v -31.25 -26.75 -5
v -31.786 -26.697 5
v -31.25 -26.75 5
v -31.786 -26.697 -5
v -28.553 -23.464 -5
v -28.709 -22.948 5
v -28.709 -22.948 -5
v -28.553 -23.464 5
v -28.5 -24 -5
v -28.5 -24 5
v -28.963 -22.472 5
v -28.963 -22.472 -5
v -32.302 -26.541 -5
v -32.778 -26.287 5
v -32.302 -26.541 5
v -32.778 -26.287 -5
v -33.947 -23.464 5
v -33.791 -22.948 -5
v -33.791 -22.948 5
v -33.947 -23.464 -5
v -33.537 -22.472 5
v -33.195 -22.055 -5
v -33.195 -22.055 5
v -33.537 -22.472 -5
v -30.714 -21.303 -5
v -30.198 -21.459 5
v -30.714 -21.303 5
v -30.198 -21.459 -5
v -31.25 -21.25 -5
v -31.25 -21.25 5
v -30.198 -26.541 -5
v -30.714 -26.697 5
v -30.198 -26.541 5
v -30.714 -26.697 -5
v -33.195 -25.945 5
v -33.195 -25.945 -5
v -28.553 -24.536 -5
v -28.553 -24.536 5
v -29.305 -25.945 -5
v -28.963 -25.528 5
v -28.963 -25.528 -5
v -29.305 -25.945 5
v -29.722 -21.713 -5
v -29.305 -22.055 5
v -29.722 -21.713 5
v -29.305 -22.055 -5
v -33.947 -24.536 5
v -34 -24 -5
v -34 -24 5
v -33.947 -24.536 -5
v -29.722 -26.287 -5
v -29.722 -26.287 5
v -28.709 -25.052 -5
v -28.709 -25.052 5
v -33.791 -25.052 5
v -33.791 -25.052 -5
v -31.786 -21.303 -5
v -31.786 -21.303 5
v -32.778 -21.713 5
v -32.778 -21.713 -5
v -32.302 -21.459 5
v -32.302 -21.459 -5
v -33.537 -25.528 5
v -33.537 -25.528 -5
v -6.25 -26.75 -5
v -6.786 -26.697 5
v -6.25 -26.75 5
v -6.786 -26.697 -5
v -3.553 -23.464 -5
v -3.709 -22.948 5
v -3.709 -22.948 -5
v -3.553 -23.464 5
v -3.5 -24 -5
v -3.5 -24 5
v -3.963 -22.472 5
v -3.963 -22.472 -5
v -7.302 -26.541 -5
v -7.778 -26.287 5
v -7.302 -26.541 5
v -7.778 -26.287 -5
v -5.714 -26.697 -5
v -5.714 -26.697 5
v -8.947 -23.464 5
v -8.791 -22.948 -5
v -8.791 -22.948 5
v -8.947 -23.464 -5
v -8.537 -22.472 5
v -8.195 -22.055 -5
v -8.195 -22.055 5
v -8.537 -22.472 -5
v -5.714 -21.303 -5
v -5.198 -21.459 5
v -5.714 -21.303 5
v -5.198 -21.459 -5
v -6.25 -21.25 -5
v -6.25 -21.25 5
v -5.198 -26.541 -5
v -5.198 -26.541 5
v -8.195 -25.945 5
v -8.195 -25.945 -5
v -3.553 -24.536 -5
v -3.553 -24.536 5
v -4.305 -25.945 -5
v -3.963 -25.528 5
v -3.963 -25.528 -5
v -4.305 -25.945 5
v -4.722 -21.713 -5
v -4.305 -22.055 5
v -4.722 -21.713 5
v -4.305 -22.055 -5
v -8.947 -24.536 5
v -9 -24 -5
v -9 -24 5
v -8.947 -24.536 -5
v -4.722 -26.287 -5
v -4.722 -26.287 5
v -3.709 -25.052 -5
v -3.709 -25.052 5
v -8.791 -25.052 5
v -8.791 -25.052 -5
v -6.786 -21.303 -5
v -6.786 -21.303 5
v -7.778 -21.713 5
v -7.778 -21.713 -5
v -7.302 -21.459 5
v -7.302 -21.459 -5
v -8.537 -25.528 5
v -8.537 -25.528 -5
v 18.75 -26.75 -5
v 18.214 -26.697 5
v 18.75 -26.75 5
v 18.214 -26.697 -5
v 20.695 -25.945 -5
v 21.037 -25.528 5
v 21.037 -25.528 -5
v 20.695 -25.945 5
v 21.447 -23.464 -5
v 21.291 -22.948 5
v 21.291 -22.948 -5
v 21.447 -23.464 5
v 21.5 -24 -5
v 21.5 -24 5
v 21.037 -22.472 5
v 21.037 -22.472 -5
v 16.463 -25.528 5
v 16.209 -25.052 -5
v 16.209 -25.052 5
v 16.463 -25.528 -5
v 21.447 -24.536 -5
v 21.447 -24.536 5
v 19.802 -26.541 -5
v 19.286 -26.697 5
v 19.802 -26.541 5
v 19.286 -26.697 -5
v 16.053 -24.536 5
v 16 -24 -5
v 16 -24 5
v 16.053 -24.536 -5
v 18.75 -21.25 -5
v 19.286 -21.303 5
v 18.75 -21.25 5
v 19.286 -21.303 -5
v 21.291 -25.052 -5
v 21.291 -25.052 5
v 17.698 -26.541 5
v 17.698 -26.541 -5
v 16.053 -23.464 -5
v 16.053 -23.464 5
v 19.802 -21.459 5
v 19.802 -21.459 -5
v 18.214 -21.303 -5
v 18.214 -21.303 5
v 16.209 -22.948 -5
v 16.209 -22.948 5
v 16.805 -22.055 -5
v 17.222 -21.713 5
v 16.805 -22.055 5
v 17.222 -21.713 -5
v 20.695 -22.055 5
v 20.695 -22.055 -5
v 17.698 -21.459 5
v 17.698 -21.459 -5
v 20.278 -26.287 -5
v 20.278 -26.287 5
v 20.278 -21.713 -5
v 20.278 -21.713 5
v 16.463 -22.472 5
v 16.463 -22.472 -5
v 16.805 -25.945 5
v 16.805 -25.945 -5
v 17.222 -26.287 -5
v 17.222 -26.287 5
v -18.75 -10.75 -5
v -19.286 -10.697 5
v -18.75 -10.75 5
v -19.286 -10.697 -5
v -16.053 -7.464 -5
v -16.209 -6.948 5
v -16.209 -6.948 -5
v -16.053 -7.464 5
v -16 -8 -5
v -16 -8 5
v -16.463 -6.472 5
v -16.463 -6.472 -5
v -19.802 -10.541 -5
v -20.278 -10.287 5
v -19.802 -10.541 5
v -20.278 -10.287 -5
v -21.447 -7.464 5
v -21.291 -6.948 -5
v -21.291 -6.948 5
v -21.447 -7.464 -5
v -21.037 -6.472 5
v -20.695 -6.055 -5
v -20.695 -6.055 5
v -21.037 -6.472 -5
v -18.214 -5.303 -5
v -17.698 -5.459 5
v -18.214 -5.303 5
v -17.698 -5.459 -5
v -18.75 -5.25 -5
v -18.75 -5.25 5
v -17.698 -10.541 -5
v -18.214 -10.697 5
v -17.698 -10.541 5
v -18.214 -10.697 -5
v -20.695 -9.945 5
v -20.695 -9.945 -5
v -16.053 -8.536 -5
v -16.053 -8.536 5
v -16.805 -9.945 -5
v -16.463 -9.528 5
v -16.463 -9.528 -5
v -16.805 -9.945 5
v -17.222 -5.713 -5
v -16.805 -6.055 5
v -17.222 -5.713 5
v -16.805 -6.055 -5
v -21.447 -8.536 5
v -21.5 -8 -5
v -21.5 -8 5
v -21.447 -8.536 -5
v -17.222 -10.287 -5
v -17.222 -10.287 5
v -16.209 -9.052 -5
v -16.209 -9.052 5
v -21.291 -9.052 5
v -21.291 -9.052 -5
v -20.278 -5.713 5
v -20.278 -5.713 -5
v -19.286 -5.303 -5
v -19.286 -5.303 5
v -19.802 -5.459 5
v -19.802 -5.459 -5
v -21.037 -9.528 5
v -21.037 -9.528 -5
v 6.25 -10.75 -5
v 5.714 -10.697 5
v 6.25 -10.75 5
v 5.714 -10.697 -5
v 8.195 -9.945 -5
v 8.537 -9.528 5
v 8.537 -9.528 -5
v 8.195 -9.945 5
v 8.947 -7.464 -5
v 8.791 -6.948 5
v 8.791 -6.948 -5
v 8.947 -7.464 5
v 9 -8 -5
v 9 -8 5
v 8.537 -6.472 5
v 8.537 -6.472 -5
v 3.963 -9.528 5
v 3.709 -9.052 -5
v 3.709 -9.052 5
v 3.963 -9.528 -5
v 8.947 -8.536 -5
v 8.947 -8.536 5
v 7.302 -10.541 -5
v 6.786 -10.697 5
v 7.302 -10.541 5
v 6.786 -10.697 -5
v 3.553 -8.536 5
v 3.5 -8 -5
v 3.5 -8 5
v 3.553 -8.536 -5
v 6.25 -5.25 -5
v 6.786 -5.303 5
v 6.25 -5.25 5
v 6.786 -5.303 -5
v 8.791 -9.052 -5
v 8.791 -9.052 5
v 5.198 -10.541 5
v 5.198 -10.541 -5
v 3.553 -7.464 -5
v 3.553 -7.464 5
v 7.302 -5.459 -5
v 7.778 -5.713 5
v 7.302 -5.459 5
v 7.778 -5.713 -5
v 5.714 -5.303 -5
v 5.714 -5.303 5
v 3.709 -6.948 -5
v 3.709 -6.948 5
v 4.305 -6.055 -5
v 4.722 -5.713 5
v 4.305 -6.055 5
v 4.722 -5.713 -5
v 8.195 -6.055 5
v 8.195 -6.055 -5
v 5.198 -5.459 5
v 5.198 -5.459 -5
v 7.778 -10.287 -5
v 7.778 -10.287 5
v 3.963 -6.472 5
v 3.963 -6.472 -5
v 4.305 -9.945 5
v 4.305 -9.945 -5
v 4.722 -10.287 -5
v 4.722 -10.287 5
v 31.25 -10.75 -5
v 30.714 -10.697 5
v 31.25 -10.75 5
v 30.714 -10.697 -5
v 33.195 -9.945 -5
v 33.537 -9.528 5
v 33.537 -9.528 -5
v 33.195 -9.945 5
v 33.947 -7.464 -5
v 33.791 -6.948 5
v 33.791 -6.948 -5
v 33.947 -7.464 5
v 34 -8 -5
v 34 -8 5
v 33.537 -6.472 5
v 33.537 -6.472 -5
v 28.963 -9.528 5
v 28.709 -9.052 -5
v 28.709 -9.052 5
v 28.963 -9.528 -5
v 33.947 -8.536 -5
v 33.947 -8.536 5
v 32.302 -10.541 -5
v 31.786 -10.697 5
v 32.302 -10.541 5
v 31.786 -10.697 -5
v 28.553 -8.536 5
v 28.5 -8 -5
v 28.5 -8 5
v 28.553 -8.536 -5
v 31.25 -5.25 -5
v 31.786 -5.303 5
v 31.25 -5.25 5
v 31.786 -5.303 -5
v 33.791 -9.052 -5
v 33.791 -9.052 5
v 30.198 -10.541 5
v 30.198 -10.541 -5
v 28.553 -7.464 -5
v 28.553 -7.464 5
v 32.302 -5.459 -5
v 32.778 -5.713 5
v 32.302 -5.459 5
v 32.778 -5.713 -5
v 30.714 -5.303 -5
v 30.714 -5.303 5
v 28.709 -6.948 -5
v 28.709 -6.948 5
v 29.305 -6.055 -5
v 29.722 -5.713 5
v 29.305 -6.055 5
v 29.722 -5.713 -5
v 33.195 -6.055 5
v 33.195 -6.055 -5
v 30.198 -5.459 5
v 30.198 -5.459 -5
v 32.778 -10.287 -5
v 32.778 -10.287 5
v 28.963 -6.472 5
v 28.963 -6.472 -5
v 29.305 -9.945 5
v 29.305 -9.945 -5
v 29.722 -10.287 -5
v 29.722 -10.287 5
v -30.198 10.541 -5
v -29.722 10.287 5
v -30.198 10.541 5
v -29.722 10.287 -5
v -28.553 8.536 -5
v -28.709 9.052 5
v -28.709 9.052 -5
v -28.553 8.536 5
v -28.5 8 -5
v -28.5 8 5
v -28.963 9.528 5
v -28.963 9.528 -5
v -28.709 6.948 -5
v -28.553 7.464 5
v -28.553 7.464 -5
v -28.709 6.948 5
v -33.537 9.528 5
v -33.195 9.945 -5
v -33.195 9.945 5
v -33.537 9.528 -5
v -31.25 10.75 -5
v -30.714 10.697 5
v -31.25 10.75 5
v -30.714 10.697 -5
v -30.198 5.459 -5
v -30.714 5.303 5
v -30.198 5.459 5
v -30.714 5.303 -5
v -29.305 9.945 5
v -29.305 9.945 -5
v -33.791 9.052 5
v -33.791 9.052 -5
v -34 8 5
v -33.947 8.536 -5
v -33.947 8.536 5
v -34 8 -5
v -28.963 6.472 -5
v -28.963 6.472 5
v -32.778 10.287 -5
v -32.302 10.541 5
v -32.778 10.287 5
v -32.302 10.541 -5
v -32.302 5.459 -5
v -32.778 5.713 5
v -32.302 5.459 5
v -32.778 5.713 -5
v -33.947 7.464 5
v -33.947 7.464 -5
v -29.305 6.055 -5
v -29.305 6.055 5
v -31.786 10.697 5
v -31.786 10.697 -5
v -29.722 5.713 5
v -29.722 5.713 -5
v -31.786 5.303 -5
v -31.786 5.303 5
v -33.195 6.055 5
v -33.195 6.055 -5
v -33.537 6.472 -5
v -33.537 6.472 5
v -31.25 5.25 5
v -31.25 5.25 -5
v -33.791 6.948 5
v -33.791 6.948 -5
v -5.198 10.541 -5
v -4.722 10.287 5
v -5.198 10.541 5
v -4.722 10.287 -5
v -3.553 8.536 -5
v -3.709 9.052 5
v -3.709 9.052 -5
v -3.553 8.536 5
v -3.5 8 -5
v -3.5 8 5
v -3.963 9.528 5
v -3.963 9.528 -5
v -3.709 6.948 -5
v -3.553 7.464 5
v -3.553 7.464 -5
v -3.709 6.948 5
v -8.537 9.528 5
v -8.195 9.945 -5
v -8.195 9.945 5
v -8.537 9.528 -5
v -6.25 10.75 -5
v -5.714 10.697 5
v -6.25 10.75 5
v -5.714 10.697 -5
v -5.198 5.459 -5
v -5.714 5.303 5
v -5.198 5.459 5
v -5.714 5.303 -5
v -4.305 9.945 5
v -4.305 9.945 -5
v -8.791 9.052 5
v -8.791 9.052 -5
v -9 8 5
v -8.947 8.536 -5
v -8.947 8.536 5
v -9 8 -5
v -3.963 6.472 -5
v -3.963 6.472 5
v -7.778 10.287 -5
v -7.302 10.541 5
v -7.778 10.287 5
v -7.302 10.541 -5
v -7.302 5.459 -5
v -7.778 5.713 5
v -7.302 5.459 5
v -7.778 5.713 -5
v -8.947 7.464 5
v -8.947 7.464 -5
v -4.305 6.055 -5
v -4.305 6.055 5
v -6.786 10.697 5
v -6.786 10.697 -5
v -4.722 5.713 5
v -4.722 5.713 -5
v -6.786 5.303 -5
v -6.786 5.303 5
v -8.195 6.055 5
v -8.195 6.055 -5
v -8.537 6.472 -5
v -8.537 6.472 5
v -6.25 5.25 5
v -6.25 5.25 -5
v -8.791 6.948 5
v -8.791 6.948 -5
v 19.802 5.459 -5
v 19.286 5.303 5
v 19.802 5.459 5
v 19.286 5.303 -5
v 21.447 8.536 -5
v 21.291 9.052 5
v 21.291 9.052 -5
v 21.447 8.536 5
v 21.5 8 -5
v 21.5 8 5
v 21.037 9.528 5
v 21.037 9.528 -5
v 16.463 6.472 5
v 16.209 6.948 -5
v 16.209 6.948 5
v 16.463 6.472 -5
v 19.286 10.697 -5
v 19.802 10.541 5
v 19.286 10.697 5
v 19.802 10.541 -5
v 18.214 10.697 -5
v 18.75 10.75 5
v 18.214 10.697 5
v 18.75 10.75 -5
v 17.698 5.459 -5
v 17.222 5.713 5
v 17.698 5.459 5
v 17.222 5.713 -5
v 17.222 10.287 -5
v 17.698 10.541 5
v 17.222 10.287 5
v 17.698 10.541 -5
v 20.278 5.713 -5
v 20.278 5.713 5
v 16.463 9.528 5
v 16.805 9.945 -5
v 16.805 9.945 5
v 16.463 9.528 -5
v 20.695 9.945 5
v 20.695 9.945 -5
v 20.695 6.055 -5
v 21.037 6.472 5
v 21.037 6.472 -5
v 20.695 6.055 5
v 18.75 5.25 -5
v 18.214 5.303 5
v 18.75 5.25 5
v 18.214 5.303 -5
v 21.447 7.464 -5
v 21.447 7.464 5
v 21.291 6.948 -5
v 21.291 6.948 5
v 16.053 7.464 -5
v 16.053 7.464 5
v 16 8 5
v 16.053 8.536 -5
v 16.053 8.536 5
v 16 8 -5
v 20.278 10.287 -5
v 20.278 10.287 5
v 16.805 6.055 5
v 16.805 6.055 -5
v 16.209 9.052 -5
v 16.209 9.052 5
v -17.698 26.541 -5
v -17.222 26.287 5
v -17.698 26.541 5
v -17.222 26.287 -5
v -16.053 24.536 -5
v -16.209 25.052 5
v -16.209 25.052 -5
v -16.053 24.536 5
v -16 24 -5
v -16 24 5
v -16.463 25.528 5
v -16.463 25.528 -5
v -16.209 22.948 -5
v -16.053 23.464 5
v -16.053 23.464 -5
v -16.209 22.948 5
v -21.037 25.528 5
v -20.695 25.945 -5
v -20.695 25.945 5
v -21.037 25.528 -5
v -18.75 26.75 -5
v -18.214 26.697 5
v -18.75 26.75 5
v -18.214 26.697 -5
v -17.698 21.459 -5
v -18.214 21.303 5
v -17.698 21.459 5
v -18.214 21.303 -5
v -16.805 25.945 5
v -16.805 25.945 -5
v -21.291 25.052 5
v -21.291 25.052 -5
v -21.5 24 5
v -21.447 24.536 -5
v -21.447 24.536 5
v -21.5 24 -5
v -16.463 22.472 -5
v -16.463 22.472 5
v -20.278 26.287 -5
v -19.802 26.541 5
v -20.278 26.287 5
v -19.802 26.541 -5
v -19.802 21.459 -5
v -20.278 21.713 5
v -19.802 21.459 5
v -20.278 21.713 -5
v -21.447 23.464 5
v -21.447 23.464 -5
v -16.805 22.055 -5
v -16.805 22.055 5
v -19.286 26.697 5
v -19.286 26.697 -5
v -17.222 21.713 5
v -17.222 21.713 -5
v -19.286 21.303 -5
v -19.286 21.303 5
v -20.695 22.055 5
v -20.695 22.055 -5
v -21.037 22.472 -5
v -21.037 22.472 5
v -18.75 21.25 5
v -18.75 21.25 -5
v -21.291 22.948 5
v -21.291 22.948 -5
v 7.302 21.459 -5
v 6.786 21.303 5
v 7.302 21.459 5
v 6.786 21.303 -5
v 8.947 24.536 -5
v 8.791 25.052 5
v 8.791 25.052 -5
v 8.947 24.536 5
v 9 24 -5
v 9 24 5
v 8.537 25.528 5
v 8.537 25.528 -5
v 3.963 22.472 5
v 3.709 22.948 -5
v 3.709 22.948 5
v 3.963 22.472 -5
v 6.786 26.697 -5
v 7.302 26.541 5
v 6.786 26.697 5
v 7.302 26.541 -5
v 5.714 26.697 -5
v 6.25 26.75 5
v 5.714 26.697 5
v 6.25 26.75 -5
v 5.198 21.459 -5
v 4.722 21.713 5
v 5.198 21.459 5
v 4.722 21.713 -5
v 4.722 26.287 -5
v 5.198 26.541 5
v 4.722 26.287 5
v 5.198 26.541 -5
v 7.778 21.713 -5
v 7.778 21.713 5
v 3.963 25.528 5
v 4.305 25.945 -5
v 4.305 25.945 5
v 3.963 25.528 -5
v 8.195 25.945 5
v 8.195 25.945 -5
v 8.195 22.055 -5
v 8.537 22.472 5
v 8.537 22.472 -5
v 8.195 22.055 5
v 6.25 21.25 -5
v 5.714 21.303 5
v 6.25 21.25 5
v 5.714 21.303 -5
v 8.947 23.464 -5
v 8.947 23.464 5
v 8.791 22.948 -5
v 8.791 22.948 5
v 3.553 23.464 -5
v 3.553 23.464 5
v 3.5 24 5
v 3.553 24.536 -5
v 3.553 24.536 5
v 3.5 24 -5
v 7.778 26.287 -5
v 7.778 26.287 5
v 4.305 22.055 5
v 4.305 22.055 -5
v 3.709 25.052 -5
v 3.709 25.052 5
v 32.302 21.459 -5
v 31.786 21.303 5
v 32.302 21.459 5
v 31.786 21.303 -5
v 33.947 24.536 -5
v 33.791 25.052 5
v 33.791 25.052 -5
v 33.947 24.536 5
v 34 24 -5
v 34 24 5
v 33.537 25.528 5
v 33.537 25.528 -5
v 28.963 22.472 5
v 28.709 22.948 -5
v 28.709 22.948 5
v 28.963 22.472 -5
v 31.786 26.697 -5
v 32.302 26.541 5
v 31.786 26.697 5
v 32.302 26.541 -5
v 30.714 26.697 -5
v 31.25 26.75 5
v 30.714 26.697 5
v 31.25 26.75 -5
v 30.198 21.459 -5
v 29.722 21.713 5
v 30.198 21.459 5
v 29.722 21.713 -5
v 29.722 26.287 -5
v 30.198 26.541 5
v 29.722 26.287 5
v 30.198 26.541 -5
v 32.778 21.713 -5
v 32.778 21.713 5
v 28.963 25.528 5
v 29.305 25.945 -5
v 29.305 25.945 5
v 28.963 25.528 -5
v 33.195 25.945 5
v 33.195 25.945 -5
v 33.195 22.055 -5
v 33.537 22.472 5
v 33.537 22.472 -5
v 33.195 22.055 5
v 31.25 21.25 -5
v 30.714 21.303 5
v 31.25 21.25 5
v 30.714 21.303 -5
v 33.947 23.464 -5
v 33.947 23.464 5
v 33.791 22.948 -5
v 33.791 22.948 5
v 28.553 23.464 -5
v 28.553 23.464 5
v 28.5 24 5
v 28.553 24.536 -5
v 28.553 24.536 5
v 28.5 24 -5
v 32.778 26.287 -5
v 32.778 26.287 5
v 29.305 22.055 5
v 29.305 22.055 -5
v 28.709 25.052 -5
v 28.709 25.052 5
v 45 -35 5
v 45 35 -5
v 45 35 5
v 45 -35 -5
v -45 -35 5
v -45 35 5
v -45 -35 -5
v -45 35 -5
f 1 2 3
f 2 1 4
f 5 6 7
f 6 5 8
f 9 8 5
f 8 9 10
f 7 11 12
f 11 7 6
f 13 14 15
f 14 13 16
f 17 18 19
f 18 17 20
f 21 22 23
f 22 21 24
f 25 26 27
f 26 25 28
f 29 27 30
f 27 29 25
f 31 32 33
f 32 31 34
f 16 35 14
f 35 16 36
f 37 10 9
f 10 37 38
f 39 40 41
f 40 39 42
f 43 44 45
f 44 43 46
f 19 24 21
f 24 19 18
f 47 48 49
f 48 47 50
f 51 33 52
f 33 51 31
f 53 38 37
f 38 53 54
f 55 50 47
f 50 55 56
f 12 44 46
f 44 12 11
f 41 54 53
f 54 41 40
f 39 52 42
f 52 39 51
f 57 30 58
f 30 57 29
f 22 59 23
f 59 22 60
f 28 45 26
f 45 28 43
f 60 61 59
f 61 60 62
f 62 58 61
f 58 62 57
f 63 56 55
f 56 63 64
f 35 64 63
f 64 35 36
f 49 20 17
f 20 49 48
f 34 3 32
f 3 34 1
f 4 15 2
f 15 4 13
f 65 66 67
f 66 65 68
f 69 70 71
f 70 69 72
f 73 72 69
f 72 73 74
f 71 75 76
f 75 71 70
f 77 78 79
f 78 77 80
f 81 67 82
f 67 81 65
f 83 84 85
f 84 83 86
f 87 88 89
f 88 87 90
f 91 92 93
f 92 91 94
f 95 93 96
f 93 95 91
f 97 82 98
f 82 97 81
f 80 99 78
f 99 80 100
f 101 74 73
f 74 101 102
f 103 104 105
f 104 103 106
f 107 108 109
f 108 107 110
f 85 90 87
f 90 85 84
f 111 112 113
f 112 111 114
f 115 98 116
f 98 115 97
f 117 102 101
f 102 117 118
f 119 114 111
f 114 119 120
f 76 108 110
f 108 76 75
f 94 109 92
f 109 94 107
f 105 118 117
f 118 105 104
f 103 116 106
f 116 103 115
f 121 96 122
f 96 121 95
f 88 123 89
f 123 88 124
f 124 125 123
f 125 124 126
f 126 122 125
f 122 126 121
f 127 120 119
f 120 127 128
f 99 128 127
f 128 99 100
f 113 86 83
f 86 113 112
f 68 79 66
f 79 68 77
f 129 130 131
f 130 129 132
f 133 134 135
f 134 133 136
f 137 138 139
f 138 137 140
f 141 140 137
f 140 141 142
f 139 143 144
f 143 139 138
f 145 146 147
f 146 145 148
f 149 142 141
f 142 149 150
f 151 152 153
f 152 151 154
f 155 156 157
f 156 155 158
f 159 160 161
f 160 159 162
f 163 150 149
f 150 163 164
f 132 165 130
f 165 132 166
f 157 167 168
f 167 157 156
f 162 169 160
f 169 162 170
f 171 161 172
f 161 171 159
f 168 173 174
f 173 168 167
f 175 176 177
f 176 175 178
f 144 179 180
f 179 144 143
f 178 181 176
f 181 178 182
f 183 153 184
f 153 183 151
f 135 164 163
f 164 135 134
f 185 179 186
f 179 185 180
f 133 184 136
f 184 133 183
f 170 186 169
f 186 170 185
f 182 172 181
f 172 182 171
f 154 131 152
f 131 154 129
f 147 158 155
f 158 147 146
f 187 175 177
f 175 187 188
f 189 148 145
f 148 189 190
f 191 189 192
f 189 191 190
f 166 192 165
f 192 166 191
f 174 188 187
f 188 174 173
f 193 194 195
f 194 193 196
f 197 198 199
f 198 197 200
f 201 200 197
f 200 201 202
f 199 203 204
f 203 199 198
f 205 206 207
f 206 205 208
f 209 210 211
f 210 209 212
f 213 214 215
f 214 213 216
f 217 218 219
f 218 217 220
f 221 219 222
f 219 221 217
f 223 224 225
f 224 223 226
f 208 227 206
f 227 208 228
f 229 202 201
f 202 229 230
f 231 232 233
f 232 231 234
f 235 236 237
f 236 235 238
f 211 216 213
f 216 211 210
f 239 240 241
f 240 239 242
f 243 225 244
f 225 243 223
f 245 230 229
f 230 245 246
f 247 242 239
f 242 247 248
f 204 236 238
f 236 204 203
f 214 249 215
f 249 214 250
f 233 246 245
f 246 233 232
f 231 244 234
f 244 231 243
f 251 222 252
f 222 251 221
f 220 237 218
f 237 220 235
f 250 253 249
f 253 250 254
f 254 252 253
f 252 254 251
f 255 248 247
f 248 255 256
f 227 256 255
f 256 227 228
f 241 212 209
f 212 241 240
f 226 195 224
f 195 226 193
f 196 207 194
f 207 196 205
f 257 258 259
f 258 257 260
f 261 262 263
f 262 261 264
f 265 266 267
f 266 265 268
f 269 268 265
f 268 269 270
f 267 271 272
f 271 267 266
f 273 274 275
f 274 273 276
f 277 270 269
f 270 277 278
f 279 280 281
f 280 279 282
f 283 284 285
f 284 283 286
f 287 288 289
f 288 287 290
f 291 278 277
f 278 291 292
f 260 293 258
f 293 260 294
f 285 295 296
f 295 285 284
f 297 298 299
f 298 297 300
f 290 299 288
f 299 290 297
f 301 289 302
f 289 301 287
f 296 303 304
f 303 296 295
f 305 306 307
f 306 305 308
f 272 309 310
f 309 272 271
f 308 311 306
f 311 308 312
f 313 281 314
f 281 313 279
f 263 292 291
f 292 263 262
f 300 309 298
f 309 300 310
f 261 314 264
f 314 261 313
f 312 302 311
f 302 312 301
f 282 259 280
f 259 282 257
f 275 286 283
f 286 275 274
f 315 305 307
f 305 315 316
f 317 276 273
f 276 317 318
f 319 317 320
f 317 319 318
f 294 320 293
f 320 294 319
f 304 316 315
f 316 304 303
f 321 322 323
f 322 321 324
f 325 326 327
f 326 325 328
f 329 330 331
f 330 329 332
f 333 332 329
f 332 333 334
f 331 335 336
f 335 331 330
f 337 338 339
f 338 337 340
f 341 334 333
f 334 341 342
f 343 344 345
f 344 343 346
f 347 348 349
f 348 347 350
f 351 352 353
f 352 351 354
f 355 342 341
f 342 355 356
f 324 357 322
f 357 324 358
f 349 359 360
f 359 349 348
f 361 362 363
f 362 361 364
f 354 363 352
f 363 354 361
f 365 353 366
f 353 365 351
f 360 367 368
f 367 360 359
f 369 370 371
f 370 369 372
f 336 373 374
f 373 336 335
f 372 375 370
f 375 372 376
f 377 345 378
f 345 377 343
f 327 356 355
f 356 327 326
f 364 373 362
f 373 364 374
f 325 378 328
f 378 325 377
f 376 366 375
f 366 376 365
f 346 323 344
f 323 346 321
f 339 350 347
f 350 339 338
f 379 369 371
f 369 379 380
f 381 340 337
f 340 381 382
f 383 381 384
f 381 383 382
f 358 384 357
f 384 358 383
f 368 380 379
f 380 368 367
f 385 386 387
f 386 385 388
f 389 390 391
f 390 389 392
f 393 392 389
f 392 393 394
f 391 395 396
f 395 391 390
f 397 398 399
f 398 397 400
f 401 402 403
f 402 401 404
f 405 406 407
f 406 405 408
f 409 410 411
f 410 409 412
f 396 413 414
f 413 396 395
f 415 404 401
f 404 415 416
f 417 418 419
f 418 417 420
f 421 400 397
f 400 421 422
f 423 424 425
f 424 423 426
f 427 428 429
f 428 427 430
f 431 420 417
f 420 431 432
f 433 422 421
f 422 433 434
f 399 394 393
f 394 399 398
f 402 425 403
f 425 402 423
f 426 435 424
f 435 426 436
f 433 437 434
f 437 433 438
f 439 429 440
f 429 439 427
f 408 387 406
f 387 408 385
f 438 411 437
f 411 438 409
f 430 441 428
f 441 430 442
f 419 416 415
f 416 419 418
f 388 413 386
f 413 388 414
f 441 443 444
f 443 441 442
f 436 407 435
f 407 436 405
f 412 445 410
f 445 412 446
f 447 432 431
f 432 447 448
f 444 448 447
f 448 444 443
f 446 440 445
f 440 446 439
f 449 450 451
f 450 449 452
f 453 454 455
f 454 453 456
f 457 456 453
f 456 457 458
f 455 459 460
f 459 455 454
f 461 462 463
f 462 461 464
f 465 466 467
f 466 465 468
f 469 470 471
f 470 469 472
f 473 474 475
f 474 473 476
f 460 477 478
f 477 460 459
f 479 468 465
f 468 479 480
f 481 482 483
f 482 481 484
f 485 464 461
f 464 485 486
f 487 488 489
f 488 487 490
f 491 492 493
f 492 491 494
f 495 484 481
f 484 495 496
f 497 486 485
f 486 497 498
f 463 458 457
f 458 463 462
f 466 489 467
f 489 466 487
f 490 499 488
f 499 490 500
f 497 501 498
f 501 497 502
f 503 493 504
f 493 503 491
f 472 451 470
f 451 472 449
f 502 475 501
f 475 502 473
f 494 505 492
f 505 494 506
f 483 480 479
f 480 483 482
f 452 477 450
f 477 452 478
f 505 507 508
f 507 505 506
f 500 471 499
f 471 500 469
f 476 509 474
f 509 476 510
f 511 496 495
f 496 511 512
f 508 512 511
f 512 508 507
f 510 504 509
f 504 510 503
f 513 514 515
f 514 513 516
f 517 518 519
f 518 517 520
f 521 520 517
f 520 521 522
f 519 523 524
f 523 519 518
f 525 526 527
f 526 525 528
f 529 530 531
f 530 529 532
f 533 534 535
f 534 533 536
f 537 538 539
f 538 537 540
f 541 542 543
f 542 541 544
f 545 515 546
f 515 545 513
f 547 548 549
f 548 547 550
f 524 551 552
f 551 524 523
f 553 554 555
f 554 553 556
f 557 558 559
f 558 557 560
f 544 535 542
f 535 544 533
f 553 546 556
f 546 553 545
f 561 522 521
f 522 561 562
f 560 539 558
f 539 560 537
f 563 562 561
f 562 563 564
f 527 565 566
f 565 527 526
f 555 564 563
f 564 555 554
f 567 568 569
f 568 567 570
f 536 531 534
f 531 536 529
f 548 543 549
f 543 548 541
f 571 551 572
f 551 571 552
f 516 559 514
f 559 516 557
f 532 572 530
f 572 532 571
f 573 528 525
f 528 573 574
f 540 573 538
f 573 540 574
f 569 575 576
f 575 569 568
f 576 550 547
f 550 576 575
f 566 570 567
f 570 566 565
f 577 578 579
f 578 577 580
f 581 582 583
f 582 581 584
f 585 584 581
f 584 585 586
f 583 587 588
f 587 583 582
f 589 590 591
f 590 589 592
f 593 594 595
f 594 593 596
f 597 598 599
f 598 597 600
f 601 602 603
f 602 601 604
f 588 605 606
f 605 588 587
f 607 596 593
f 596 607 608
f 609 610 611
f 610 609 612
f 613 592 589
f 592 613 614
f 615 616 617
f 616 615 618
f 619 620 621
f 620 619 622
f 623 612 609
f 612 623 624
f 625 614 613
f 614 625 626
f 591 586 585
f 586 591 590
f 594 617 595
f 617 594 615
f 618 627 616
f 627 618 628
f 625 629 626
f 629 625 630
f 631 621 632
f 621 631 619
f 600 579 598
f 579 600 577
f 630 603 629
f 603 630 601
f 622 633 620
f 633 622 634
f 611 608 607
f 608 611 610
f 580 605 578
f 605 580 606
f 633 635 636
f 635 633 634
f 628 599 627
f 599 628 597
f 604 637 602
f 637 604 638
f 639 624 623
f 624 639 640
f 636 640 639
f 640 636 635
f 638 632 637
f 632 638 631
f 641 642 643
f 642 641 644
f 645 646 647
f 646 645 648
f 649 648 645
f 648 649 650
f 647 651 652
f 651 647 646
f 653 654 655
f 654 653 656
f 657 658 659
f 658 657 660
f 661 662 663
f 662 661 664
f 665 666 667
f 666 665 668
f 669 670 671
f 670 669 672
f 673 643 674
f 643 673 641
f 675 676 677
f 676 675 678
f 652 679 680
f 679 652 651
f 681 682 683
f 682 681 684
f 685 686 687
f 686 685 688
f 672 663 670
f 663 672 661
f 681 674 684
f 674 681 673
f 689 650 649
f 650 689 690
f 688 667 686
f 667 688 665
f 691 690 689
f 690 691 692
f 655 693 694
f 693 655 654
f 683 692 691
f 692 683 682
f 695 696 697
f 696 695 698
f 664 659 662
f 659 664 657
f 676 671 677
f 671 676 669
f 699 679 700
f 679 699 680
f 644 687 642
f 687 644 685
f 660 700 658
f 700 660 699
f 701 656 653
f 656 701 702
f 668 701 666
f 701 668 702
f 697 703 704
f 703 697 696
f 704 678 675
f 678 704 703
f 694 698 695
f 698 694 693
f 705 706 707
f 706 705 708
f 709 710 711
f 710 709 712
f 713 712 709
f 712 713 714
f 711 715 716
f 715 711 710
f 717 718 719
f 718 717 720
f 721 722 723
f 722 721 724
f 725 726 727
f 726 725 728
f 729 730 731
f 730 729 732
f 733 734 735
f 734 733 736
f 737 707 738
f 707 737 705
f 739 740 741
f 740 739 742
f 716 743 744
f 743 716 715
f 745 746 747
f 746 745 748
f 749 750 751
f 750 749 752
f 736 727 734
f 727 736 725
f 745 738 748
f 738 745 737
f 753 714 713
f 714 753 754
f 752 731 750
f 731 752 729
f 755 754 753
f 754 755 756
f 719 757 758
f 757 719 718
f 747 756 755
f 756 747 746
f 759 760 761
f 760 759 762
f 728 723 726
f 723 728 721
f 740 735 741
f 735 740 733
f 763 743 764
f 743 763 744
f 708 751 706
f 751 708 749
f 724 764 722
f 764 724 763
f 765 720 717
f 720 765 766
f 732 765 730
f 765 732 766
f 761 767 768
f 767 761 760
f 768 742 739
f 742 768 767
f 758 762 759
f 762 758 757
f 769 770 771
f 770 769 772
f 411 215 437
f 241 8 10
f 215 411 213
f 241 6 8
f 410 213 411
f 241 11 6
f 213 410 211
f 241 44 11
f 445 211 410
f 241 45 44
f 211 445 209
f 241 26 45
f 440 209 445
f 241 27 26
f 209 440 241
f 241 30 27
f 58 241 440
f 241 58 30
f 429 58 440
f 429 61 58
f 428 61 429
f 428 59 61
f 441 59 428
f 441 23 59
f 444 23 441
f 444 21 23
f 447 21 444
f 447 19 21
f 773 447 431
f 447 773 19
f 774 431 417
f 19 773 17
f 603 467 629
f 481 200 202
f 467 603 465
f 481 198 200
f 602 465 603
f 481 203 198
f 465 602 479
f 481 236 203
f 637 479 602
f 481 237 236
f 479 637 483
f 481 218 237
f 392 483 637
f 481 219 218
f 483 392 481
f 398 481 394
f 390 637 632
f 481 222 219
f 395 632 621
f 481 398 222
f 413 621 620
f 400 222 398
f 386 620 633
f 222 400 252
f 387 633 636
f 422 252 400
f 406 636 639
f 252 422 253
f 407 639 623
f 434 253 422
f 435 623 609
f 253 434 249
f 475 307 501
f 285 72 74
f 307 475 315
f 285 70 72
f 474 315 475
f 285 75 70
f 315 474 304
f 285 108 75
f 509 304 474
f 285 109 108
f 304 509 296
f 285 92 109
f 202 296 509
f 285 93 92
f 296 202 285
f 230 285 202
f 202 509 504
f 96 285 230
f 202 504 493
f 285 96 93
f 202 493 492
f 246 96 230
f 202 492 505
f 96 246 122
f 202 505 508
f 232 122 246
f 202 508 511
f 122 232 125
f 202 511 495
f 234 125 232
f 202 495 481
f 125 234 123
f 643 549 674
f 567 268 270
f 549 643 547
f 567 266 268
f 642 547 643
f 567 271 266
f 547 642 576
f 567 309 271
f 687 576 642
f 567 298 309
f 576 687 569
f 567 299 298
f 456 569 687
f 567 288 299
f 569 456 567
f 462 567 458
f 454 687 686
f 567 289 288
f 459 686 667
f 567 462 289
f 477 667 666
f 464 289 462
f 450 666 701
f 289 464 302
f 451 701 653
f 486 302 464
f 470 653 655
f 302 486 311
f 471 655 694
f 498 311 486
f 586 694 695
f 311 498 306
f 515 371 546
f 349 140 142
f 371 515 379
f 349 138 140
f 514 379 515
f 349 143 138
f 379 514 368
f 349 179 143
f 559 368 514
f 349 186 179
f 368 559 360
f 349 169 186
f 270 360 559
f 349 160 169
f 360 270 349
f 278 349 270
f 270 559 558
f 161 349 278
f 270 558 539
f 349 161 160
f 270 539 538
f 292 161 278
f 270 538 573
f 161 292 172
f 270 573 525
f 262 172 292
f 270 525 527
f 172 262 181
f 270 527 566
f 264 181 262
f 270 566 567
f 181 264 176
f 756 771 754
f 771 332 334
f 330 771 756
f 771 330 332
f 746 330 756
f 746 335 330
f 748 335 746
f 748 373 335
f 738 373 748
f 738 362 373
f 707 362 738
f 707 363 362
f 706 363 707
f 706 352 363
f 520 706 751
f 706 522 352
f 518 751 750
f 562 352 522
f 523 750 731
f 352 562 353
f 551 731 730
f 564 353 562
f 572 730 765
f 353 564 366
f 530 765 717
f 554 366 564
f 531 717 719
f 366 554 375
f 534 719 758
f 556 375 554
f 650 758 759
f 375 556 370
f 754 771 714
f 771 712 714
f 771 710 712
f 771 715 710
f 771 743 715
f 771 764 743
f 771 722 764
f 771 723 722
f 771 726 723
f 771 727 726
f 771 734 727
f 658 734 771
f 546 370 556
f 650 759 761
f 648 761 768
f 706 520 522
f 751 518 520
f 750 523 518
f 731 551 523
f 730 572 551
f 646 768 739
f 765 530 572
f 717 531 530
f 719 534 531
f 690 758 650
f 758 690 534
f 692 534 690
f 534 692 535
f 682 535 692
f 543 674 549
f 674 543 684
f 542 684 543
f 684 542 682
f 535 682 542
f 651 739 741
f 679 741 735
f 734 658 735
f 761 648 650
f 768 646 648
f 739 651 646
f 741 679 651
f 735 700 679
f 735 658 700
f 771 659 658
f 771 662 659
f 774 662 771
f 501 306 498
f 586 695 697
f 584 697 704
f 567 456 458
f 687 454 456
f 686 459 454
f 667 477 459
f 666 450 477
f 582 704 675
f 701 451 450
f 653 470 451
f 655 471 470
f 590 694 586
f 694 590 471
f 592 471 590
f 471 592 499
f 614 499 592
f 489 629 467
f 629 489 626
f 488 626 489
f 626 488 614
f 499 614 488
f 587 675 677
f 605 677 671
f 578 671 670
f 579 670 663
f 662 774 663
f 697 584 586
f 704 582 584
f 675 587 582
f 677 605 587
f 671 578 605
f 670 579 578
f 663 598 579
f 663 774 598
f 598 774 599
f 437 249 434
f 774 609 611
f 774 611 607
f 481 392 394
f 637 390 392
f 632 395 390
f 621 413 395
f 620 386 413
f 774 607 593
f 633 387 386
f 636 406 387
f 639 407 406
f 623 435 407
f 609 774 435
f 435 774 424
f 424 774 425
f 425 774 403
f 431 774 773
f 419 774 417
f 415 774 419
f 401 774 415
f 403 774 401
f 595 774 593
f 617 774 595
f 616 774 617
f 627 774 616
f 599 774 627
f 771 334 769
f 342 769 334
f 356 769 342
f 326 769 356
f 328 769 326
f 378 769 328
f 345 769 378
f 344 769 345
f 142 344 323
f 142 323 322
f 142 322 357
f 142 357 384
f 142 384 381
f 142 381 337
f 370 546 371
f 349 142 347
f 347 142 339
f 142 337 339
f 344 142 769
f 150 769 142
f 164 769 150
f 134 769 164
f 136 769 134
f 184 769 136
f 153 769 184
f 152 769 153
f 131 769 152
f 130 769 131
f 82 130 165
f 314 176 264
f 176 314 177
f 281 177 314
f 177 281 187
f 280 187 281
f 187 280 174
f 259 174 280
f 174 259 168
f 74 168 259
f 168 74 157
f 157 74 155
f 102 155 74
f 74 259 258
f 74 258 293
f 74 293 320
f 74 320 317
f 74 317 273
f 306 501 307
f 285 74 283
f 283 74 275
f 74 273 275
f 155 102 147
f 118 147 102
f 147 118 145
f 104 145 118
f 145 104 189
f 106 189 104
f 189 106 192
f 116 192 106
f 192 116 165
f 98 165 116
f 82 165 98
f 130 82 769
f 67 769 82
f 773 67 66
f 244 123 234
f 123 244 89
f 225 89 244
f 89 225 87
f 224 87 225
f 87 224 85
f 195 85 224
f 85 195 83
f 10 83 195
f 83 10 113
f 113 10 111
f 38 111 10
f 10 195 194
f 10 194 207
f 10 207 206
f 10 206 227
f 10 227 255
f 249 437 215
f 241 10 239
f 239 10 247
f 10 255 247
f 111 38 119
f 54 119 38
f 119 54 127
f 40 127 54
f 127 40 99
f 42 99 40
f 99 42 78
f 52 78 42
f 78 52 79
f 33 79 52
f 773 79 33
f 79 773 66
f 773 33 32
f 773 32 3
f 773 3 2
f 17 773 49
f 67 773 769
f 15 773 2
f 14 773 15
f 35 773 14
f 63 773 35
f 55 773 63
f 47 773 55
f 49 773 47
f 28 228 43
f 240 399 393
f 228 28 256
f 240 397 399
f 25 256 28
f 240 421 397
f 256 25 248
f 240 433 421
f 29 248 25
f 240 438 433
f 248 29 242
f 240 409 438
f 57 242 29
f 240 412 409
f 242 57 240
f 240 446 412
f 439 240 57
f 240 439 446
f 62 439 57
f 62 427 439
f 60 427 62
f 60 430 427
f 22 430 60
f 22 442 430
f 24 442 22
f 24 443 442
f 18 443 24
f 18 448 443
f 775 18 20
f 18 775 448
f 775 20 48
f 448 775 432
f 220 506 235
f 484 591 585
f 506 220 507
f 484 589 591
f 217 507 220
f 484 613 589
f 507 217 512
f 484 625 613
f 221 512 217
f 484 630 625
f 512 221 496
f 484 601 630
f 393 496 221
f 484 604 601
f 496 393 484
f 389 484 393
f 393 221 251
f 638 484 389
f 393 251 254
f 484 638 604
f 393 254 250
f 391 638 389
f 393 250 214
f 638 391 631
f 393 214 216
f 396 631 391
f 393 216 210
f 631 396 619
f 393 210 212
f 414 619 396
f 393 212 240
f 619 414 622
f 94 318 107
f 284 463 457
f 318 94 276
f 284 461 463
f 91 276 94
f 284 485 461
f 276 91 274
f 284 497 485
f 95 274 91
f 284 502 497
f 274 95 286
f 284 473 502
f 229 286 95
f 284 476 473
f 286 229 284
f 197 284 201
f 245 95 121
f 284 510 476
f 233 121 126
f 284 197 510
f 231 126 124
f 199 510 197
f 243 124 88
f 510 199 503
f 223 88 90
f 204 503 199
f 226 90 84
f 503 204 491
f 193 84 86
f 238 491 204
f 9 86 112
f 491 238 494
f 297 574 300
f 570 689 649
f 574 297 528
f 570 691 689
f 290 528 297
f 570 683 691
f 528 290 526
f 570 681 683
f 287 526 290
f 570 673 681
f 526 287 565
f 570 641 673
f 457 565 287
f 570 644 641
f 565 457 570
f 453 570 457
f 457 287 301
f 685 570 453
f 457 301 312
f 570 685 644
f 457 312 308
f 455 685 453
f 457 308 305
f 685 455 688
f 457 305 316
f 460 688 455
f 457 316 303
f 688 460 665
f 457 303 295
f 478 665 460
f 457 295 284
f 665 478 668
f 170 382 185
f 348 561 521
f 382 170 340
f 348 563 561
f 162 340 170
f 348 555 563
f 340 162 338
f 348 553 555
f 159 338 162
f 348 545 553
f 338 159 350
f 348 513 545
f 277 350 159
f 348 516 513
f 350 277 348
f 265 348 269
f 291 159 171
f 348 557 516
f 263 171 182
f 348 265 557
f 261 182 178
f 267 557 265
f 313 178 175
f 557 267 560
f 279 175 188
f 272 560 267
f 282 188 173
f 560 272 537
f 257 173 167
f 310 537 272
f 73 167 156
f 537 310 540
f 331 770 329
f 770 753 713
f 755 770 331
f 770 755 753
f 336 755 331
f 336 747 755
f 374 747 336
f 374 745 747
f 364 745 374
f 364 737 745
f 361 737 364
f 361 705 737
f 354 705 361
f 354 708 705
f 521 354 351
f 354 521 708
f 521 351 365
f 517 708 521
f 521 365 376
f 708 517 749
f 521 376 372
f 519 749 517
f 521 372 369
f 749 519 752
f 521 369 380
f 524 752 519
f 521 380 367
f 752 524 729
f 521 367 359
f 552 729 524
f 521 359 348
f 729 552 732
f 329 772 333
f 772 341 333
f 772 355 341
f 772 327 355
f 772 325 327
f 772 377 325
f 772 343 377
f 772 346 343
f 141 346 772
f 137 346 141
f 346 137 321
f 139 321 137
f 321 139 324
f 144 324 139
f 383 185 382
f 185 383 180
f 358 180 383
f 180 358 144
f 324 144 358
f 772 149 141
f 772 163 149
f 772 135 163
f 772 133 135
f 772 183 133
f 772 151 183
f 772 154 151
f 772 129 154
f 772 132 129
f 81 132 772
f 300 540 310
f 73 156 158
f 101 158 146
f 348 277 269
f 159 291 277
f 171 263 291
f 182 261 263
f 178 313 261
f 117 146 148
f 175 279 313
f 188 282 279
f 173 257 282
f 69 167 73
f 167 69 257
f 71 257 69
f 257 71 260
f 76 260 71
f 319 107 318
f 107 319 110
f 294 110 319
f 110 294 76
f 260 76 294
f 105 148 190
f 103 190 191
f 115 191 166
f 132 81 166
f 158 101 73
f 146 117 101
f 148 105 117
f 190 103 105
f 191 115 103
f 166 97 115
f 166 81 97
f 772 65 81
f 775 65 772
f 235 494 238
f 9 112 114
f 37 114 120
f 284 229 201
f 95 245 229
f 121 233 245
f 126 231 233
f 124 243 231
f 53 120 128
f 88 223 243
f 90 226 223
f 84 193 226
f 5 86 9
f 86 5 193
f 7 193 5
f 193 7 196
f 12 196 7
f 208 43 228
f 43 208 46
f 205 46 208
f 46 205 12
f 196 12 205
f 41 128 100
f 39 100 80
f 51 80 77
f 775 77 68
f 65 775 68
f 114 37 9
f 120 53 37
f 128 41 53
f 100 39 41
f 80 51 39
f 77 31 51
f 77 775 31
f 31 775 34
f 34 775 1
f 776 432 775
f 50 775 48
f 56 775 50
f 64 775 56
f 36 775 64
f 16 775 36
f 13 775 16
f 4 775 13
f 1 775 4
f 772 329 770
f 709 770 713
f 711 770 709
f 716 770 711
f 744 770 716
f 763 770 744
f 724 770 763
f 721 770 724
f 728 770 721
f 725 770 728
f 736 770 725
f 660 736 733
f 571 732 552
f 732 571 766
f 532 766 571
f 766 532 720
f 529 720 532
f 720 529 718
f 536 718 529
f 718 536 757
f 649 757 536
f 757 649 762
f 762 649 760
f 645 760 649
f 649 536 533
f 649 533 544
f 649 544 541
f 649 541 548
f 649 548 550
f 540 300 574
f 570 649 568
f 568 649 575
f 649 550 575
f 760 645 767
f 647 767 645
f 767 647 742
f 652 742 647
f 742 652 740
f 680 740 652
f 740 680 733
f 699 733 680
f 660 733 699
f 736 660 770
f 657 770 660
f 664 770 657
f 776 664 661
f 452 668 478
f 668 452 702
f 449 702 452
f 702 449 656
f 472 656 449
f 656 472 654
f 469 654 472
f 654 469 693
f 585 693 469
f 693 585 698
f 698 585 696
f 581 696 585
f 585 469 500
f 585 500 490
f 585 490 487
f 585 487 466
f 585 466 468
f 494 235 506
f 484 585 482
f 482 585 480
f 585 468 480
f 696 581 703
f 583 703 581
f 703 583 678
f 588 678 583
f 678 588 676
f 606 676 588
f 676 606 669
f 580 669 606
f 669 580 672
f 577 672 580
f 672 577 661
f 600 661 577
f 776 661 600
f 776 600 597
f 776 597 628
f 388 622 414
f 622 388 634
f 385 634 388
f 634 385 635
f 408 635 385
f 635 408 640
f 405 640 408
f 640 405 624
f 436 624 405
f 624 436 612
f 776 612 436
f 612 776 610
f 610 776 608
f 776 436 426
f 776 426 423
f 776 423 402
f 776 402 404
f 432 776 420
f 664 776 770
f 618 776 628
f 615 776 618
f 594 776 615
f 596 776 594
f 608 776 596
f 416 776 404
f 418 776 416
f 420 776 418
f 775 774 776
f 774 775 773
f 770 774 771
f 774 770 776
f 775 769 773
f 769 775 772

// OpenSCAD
$fn = 32;

// ----------------------------------------------------------------------
// Perforated panel 90 x 70 x 10
// 4 x 3 Ø5.5 holes, checker layout
// ----------------------------------------------------------------------

// --- parameters (mm) ---
panel = [90, 70, 10];  // overall size (x, y, z)
hole_d = 5.5;          // hole diameter
pitch_x = 25;          // hole pitch along X
pitch_y = 16;          // hole pitch along Y

// --- derived feature positions (mm) ---
margin = hole_d / 2 + 2;            // = 4.75   clearance from the panel edge
row_offset = pitch_x / 2;           // = 12.5   shift of every other row
cols = floor((panel[0] - 2 * margin - row_offset) / pitch_x) + 1;  // = 3   how many columns fit in X
rows = floor((panel[1] - 2 * margin) / pitch_y) + 1;  // = 4   how many rows fit in Y
span_x = (cols - 1) * pitch_x + row_offset;  // = 62.5   width of the field
span_y = (rows - 1) * pitch_y;      // = 48   height of the field
origin_x = -span_x / 2;             // = -31.25   X of the first hole
origin_y = -span_y / 2;             // = -24   Y of the first row
holes = rows * cols;                // = 12   holes in total
feature_centers = [
  [origin_x + 0 * pitch_x, origin_y + 0 * pitch_y],
  [origin_x + 1 * pitch_x, origin_y + 0 * pitch_y],
  [origin_x + 2 * pitch_x, origin_y + 0 * pitch_y],
  [origin_x + row_offset + 0 * pitch_x, origin_y + 1 * pitch_y],
  [origin_x + row_offset + 1 * pitch_x, origin_y + 1 * pitch_y],
  [origin_x + row_offset + 2 * pitch_x, origin_y + 1 * pitch_y],
  [origin_x + 0 * pitch_x, origin_y + 2 * pitch_y],
  [origin_x + 1 * pitch_x, origin_y + 2 * pitch_y],
  [origin_x + 2 * pitch_x, origin_y + 2 * pitch_y],
  [origin_x + row_offset + 0 * pitch_x, origin_y + 3 * pitch_y],
  [origin_x + row_offset + 1 * pitch_x, origin_y + 3 * pitch_y],
  [origin_x + row_offset + 2 * pitch_x, origin_y + 3 * pitch_y]
];   // hole centres, used verbatim by the cutter loop

// panel outline, every hole through
difference() {
  cube(panel, center = true);
  for (centre = feature_centers)
    translate([centre[0], centre[1], 0])
      cylinder(d = hole_d, h = panel[2] + 2, center = true);
}
